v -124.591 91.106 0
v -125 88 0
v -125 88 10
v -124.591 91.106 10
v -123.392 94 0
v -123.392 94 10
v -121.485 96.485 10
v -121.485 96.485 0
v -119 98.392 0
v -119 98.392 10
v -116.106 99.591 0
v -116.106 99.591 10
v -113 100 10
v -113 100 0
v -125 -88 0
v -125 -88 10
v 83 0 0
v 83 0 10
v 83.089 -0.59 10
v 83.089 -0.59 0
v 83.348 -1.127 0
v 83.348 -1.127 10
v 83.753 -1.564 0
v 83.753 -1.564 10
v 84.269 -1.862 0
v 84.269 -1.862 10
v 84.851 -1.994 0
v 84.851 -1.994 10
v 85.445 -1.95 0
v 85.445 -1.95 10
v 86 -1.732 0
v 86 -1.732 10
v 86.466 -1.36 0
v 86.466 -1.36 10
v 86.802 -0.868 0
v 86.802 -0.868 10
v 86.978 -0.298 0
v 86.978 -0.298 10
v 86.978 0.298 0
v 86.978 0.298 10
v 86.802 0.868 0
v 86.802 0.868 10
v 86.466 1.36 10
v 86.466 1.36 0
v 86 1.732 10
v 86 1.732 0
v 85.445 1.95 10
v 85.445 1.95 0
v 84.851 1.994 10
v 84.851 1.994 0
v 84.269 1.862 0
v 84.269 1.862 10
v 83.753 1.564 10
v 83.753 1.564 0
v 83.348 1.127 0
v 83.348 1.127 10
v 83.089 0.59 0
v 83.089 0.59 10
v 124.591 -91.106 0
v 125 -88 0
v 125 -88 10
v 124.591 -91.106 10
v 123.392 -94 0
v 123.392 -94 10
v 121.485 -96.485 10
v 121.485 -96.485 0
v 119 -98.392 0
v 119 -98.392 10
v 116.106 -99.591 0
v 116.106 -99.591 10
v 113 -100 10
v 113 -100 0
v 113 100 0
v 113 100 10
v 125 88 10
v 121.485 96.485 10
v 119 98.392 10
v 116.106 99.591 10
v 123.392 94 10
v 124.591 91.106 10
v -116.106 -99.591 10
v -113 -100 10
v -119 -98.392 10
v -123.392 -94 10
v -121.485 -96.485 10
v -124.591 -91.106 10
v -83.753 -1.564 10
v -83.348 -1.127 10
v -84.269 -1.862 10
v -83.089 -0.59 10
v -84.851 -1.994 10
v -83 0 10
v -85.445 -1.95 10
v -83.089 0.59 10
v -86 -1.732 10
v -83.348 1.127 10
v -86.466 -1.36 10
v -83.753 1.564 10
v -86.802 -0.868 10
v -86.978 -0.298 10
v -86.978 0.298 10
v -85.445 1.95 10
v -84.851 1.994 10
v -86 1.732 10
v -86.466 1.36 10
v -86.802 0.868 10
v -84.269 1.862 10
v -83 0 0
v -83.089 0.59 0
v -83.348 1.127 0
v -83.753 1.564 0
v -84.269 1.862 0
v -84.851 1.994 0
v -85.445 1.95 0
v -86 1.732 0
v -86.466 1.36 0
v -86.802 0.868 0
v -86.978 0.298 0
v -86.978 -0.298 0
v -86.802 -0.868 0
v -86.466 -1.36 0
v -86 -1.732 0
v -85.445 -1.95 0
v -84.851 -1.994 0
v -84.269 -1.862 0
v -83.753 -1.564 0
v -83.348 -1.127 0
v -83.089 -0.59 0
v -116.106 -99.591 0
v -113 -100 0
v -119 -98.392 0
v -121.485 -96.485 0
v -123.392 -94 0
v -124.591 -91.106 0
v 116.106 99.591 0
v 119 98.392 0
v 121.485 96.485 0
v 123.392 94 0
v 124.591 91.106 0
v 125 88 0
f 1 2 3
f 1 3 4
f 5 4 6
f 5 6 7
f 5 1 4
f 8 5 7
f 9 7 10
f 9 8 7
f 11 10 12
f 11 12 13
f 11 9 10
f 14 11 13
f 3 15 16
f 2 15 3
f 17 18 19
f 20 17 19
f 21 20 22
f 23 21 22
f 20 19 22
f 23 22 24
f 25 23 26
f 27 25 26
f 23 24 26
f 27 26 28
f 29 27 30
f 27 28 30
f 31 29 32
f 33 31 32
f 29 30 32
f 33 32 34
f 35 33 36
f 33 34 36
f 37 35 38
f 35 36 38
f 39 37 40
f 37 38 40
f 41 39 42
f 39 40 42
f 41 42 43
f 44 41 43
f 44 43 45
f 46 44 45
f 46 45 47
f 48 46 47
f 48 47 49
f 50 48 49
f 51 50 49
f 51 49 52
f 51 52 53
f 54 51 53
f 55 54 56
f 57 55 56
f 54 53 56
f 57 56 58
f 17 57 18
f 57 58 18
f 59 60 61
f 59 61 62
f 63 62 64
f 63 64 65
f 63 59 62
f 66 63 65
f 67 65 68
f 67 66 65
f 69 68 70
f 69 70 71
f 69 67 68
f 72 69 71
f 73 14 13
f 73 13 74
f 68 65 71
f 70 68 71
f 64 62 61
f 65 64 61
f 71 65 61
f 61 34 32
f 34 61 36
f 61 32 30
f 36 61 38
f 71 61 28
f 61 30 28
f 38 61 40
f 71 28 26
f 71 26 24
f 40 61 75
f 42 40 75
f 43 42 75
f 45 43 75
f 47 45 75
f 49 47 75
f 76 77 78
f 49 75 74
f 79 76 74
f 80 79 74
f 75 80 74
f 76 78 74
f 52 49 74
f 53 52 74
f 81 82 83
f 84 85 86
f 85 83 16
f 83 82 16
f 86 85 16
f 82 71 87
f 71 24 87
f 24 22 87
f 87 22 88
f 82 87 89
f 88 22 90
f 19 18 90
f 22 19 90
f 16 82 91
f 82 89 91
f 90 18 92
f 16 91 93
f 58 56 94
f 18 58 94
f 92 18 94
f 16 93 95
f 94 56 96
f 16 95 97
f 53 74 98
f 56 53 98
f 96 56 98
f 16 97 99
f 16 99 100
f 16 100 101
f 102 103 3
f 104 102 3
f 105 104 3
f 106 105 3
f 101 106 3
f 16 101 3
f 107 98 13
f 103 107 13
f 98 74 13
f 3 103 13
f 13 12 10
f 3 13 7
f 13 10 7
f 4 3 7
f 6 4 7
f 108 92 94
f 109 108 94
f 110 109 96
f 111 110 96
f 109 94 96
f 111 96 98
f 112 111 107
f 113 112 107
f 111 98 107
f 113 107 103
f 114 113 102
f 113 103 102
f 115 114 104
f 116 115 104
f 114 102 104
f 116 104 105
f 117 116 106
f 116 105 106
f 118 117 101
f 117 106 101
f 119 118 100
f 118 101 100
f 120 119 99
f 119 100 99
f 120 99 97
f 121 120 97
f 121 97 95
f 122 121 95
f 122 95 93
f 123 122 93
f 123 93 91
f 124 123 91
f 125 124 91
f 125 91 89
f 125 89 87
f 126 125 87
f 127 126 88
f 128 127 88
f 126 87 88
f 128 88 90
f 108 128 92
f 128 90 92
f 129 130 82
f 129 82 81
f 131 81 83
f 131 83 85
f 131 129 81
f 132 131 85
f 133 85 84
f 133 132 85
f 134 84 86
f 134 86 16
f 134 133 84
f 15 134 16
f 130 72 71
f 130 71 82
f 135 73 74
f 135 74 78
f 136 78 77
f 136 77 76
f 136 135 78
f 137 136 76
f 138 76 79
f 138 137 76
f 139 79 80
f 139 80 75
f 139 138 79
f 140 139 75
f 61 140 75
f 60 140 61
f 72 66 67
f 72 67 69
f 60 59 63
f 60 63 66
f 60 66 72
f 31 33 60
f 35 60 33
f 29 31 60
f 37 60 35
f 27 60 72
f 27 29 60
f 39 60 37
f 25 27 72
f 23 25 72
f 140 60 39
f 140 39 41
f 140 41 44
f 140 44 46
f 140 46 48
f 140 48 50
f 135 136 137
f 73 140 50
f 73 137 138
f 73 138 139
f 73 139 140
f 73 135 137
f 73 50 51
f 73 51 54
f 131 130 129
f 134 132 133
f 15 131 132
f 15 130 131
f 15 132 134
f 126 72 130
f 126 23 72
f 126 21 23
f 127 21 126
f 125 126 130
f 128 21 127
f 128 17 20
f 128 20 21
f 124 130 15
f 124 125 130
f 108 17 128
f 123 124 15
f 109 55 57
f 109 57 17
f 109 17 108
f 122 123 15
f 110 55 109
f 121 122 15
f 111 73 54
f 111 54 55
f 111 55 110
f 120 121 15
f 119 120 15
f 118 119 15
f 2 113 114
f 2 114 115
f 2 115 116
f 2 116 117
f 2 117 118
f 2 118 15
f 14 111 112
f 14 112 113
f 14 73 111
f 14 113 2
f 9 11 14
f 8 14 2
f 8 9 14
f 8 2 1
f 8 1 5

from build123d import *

# Parameters (mm, degrees)
SALIENTE_EXTRUIR1_DEPTH = 10
CROQUIS2_R              = 2
CORTAR_EXTRUIR1_DEPTH   = 10


with BuildPart() as part:
    # Croquis1 → Saliente-Extruir1 (new body)
    with BuildSketch(Plane.XY):
        with BuildLine():
            Line((113, -100), (-113, -100))
            ThreePointArc((-113, -100), (-121.485281374, -96.485281374), (-125, -88))
            Line((-125, -88), (-125, 88))
            ThreePointArc((-125, 88), (-121.485281374, 96.485281374), (-113, 100))
            Line((-113, 100), (113, 100))
            ThreePointArc((113, 100), (121.485281374, 96.485281374), (125, 88))
            Line((125, 88), (125, -88))
            ThreePointArc((125, -88), (121.485281374, -96.485281374), (113, -100))
        make_face()
    extrude(amount=SALIENTE_EXTRUIR1_DEPTH)

    # Croquis2 → Cortar-Extruir1 (cut)
    with BuildSketch(Plane.XY.offset(10)):
        with Locations((-85, 0)):
            Circle(CROQUIS2_R)
        with Locations(Location((85, 0, 0), (0, 0, 180))):
            Circle(CROQUIS2_R)
    extrude(amount=-CORTAR_EXTRUIR1_DEPTH, mode=Mode.SUBTRACT)


solid = part.part
